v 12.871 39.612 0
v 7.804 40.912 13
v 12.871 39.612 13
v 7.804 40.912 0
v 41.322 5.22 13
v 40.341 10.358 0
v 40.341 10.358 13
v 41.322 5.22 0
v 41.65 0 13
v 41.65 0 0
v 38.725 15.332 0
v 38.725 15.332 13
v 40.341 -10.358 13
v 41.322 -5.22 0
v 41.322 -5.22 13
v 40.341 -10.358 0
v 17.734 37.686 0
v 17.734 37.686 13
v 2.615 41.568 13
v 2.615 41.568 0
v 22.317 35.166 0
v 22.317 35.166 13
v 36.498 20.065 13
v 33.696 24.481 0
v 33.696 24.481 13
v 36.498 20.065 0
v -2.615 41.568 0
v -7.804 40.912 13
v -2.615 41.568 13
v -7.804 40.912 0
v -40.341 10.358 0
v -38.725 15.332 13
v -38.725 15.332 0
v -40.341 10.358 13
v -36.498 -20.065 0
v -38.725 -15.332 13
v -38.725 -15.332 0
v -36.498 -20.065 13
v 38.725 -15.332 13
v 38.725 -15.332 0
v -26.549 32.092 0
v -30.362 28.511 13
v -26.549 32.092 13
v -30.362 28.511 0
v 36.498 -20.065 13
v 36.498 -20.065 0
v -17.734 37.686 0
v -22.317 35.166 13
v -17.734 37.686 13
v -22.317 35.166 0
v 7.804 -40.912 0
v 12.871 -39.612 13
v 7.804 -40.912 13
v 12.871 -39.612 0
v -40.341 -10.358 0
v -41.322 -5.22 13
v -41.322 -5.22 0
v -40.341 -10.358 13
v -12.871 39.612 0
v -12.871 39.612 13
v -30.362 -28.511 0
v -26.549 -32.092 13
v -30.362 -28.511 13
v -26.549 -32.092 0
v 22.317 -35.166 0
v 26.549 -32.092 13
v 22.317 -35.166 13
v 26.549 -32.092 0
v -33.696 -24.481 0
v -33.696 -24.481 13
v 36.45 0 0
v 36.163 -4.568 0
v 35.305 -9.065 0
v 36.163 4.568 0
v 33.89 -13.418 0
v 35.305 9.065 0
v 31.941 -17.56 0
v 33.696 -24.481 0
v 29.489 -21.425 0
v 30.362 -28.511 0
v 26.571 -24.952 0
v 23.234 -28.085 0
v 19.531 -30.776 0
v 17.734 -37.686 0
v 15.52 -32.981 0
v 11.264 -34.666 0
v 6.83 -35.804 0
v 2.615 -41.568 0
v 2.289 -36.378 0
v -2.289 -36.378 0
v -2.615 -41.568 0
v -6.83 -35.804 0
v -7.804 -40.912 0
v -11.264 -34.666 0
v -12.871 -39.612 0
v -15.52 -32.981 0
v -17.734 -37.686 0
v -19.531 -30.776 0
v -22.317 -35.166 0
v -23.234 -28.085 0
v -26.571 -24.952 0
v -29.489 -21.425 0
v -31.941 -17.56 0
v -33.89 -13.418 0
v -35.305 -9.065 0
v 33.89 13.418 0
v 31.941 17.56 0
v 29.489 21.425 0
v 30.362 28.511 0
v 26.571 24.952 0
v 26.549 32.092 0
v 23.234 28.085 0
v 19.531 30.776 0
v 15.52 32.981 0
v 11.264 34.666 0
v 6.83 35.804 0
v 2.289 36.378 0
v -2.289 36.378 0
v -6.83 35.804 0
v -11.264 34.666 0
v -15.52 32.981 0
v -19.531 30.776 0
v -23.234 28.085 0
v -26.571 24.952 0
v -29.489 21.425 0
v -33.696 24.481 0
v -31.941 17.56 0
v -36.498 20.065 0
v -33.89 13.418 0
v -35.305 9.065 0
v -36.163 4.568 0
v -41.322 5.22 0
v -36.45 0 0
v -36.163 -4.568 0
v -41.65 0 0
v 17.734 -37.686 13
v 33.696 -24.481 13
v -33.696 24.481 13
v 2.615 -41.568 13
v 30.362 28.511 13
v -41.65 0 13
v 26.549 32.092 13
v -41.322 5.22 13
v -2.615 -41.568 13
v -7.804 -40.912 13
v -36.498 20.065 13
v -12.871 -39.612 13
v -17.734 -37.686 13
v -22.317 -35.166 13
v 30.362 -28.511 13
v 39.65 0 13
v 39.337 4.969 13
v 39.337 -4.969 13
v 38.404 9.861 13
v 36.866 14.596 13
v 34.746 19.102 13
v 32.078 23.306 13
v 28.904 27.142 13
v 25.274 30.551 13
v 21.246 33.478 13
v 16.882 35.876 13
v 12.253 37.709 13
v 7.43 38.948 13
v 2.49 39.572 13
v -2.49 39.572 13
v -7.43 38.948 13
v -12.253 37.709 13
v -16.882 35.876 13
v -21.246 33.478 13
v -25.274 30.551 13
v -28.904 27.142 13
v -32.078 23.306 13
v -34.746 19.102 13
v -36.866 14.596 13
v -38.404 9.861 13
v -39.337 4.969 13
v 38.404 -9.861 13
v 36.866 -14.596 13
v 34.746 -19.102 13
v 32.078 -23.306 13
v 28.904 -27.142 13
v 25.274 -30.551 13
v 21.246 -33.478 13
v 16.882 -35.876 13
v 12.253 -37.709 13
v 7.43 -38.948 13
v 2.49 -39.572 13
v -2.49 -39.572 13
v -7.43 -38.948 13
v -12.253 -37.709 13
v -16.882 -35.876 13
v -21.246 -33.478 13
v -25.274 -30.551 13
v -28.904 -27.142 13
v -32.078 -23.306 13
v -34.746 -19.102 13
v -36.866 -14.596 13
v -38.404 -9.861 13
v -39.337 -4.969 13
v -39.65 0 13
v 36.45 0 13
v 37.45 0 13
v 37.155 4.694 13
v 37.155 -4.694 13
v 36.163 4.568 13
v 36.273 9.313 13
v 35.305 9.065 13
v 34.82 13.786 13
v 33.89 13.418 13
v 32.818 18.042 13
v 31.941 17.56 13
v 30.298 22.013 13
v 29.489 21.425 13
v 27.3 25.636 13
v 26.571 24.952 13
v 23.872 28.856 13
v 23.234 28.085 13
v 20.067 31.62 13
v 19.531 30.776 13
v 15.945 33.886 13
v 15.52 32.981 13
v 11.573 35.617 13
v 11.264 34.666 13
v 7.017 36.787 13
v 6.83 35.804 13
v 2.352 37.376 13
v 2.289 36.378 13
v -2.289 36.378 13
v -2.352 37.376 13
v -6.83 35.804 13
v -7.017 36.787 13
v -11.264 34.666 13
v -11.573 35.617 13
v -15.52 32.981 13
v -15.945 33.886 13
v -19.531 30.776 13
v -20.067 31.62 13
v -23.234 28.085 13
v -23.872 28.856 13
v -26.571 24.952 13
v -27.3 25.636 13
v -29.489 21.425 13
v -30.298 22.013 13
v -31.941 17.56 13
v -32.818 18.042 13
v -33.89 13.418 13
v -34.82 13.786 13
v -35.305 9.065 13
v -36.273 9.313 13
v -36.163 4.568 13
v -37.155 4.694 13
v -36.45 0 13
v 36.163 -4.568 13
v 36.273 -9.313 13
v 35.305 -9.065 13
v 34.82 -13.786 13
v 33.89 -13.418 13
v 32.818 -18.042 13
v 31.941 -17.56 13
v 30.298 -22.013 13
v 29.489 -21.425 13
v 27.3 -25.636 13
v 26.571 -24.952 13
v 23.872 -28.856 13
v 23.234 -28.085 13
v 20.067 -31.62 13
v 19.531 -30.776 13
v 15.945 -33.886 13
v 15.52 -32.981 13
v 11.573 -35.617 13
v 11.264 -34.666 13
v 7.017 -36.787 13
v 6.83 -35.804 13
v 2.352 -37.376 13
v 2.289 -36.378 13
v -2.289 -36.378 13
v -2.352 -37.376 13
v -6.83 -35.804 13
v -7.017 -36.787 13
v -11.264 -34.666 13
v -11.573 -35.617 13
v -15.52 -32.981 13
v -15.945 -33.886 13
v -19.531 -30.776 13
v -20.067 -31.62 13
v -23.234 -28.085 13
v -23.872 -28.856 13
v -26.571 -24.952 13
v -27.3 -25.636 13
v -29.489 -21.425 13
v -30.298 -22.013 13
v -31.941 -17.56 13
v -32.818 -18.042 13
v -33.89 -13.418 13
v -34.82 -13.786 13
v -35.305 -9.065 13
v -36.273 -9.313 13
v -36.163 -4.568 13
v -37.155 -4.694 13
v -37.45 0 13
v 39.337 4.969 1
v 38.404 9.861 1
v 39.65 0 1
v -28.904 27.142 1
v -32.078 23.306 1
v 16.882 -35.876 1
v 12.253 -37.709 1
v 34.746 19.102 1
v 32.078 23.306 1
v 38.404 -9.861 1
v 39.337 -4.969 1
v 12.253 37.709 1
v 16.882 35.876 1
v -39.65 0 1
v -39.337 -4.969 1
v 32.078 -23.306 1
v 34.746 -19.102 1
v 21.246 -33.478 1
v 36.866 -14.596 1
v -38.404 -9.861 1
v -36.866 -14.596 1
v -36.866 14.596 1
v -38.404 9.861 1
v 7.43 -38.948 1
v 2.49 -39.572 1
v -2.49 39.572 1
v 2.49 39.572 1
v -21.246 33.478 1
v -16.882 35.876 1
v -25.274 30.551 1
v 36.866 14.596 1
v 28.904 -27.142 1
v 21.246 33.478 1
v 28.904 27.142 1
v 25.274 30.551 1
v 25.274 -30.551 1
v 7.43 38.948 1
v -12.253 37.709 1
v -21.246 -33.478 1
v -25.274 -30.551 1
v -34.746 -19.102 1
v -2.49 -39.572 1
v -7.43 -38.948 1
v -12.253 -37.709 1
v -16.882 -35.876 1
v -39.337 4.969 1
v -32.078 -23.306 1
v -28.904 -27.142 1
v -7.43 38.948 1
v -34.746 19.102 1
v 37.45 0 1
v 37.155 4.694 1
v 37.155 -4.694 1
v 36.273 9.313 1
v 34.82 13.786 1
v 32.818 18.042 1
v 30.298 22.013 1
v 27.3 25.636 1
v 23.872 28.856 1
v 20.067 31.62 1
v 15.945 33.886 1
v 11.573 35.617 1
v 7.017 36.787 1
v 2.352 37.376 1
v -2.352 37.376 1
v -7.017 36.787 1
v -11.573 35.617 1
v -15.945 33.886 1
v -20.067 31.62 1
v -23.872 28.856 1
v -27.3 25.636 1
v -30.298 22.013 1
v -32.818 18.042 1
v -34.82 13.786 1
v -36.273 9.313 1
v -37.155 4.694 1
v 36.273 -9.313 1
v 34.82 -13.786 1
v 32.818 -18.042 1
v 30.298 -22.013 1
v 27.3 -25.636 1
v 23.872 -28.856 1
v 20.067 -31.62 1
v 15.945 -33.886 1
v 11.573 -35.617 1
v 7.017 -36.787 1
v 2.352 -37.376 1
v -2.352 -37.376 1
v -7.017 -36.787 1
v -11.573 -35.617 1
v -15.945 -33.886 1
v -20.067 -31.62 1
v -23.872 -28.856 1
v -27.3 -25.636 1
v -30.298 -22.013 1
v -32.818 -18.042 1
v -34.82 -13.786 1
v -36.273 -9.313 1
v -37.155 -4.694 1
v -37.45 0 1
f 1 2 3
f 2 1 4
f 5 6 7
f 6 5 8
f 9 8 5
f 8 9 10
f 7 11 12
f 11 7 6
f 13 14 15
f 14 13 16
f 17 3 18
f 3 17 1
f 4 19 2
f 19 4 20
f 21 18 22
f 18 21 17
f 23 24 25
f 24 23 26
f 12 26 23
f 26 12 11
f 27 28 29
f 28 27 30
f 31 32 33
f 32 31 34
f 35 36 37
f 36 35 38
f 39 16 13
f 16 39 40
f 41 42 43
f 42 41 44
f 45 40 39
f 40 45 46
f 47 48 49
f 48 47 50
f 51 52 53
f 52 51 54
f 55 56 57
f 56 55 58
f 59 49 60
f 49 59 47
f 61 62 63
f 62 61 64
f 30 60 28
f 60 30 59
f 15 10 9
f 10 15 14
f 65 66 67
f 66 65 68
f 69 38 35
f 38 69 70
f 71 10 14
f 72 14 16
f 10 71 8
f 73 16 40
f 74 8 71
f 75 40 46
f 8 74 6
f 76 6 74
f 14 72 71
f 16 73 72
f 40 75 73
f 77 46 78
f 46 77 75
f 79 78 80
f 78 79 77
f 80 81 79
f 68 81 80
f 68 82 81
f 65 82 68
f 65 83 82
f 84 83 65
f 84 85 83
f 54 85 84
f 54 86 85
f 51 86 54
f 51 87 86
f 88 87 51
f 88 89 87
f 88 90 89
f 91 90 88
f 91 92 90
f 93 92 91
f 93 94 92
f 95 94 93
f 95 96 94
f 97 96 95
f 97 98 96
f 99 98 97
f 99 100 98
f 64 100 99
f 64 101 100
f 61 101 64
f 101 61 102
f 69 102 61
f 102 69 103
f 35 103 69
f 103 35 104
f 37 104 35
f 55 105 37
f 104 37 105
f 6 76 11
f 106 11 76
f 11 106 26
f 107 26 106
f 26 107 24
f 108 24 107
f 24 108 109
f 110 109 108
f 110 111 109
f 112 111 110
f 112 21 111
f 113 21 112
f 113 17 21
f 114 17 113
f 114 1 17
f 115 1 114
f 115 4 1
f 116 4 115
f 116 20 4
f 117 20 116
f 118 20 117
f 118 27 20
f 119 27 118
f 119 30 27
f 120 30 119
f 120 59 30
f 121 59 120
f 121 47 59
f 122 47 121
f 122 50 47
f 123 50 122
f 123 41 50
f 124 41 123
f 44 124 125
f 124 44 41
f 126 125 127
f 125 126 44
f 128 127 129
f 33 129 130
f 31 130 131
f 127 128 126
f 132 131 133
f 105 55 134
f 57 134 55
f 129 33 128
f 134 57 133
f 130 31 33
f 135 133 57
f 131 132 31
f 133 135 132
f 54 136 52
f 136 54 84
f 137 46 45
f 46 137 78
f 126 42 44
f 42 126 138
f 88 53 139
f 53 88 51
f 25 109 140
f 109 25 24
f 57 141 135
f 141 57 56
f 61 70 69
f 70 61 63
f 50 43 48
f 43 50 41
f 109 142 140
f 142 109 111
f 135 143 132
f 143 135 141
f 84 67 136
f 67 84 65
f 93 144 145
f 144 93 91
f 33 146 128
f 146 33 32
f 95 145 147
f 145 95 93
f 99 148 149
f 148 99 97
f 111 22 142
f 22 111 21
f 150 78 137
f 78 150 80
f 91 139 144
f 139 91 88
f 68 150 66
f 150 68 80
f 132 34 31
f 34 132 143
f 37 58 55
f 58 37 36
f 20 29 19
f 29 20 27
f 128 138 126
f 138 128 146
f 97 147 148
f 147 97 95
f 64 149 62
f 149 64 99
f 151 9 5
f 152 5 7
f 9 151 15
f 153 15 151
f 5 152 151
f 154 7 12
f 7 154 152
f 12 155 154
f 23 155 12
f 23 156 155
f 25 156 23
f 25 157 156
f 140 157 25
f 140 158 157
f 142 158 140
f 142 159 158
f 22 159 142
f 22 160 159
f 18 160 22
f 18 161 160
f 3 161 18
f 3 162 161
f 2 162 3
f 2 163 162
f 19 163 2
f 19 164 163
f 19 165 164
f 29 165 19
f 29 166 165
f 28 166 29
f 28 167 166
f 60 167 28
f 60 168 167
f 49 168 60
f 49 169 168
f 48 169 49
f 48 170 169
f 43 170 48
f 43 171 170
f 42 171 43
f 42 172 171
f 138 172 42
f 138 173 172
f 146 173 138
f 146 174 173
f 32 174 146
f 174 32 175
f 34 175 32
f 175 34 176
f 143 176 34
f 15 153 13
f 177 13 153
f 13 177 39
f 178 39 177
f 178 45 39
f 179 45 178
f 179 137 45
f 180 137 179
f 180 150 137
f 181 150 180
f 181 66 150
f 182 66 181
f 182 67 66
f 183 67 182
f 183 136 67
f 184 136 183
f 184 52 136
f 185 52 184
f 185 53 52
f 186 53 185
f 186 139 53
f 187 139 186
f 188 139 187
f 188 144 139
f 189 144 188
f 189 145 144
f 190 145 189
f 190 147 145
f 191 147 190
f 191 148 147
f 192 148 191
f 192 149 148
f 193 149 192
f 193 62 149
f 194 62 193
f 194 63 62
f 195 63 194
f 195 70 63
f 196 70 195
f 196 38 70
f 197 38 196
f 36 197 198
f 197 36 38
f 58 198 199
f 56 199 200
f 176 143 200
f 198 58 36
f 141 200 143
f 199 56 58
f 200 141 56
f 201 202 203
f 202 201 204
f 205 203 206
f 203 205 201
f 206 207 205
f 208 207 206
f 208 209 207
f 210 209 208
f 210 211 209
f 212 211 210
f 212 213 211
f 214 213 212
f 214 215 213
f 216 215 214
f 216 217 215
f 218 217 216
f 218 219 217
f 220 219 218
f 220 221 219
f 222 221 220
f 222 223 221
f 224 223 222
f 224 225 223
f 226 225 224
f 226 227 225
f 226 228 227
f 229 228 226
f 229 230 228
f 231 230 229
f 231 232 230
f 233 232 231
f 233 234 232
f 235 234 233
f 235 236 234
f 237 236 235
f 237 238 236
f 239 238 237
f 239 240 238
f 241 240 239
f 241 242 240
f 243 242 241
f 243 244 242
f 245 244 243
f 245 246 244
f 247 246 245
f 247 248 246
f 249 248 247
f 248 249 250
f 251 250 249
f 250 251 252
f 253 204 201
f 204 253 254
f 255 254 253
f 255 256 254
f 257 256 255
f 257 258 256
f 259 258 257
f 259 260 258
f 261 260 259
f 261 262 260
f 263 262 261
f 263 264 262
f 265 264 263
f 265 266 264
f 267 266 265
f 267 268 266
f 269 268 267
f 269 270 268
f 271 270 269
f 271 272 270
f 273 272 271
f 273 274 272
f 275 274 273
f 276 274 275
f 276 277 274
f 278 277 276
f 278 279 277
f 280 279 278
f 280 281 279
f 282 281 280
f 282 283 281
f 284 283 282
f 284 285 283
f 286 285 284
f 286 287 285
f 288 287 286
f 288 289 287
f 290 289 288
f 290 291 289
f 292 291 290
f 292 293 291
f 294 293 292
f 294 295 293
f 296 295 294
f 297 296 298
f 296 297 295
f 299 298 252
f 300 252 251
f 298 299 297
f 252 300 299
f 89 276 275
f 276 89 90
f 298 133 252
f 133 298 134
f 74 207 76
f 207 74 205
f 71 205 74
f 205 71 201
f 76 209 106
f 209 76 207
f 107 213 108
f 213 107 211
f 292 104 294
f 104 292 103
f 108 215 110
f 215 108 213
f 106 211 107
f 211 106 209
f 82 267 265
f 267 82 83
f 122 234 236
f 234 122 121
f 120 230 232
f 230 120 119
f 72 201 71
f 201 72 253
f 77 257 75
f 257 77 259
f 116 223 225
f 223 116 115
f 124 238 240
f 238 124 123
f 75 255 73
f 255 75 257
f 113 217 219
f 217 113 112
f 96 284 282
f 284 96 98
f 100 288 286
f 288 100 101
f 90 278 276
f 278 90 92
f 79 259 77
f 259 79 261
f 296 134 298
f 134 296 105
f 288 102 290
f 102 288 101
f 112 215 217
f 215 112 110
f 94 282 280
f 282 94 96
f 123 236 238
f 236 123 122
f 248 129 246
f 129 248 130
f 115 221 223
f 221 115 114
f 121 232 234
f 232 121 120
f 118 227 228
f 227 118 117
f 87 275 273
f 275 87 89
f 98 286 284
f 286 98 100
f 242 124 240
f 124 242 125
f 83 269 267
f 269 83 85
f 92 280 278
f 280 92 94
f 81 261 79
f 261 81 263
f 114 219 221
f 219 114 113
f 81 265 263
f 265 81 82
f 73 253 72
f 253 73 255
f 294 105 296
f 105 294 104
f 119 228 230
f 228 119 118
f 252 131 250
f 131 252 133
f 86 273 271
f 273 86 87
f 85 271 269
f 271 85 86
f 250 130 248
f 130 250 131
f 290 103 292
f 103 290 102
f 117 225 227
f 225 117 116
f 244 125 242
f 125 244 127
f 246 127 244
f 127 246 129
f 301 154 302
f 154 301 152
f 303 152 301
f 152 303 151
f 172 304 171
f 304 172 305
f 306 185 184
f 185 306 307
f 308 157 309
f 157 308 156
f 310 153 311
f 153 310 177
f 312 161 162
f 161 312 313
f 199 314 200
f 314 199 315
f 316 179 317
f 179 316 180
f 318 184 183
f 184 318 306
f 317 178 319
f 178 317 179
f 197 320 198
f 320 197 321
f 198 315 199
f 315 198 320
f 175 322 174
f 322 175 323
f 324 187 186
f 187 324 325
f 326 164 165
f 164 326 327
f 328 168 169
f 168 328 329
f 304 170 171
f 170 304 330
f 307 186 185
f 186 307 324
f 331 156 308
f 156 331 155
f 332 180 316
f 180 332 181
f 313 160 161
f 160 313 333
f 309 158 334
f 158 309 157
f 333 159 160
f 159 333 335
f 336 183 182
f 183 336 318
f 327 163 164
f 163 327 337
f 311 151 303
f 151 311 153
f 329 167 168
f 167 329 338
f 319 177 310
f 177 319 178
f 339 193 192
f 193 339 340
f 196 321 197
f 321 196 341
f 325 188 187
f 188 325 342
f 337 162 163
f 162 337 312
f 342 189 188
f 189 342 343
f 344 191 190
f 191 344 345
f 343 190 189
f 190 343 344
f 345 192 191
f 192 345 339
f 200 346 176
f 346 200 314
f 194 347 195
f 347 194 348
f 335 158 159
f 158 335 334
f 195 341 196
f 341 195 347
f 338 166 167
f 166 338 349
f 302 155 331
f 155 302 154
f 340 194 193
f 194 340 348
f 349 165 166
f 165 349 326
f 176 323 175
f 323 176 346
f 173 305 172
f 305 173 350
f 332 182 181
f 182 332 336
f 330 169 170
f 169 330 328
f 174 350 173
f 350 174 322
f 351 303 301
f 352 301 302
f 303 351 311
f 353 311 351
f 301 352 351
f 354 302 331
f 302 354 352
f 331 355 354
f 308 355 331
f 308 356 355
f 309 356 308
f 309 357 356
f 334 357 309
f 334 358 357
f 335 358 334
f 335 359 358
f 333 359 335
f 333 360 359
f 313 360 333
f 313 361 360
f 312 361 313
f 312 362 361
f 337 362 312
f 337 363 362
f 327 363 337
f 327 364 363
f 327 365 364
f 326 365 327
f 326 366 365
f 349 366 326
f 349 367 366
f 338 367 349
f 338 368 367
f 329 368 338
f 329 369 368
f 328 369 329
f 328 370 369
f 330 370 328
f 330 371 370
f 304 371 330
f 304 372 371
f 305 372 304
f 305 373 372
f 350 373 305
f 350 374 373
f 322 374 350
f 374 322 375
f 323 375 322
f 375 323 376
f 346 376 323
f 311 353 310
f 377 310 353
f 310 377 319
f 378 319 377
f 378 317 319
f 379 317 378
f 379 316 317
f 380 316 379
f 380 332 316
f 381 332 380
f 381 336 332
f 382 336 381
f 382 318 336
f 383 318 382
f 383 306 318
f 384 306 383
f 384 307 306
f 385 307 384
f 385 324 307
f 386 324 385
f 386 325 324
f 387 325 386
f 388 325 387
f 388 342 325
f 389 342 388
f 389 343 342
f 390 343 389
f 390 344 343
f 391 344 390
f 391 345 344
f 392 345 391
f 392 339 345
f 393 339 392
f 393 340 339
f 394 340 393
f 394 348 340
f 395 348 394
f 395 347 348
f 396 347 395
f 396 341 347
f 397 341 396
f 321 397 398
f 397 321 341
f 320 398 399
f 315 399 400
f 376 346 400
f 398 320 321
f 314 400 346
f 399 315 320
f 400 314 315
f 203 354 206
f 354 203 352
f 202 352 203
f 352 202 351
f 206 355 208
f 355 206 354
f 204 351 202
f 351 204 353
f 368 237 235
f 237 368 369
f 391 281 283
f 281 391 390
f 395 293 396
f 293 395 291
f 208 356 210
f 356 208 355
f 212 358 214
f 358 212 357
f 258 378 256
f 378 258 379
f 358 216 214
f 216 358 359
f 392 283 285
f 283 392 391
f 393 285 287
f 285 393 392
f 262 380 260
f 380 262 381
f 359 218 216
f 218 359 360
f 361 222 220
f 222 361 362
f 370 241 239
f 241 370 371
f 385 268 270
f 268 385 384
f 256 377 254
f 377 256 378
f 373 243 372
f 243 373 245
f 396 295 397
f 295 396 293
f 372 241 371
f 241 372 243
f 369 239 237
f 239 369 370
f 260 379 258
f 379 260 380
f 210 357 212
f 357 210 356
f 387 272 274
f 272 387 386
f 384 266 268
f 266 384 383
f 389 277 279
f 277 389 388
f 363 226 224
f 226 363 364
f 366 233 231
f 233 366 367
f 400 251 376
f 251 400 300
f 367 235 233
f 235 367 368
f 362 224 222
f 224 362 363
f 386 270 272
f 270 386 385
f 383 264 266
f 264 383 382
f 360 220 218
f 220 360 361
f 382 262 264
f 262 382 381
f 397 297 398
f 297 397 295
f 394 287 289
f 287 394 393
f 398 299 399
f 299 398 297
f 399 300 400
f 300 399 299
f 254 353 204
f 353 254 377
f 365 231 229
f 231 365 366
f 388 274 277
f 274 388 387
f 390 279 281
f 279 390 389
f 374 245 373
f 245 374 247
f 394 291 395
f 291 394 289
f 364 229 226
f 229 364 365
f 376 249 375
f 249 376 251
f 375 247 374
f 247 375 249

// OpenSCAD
l = 180;
lens = 74.9;
lens_l = 11;
ocular_r = 31.7;
ocular_l = 23;
wall_t = 2.2;
screw =2.5;

difference(){
difference(){
cylinder(h = lens_l+2, r1 = lens/2+wall_t+2, r2 = lens/2+wall_t+2, center = false, $fn = 50);
translate([0,0,-1])
cylinder(h = ocular_l+2, r1 = lens/2-1, r2 = lens/2-1, center = false, $fn = 50);
}




//Principal body
translate([0,0,12])
difference(){
//External body
union(){
translate([0,0,-lens_l])
cylinder(h = lens_l+3, r1 = lens/2+wall_t, r2 = lens/2+wall_t, center = false, $fn = 50);

}

//Internal hole
translate([0,0,-ocular_l])
cylinder(h = ocular_l+3, r1 = lens/2, r2 = lens/2, center = false, $fn = 50);
}
}
